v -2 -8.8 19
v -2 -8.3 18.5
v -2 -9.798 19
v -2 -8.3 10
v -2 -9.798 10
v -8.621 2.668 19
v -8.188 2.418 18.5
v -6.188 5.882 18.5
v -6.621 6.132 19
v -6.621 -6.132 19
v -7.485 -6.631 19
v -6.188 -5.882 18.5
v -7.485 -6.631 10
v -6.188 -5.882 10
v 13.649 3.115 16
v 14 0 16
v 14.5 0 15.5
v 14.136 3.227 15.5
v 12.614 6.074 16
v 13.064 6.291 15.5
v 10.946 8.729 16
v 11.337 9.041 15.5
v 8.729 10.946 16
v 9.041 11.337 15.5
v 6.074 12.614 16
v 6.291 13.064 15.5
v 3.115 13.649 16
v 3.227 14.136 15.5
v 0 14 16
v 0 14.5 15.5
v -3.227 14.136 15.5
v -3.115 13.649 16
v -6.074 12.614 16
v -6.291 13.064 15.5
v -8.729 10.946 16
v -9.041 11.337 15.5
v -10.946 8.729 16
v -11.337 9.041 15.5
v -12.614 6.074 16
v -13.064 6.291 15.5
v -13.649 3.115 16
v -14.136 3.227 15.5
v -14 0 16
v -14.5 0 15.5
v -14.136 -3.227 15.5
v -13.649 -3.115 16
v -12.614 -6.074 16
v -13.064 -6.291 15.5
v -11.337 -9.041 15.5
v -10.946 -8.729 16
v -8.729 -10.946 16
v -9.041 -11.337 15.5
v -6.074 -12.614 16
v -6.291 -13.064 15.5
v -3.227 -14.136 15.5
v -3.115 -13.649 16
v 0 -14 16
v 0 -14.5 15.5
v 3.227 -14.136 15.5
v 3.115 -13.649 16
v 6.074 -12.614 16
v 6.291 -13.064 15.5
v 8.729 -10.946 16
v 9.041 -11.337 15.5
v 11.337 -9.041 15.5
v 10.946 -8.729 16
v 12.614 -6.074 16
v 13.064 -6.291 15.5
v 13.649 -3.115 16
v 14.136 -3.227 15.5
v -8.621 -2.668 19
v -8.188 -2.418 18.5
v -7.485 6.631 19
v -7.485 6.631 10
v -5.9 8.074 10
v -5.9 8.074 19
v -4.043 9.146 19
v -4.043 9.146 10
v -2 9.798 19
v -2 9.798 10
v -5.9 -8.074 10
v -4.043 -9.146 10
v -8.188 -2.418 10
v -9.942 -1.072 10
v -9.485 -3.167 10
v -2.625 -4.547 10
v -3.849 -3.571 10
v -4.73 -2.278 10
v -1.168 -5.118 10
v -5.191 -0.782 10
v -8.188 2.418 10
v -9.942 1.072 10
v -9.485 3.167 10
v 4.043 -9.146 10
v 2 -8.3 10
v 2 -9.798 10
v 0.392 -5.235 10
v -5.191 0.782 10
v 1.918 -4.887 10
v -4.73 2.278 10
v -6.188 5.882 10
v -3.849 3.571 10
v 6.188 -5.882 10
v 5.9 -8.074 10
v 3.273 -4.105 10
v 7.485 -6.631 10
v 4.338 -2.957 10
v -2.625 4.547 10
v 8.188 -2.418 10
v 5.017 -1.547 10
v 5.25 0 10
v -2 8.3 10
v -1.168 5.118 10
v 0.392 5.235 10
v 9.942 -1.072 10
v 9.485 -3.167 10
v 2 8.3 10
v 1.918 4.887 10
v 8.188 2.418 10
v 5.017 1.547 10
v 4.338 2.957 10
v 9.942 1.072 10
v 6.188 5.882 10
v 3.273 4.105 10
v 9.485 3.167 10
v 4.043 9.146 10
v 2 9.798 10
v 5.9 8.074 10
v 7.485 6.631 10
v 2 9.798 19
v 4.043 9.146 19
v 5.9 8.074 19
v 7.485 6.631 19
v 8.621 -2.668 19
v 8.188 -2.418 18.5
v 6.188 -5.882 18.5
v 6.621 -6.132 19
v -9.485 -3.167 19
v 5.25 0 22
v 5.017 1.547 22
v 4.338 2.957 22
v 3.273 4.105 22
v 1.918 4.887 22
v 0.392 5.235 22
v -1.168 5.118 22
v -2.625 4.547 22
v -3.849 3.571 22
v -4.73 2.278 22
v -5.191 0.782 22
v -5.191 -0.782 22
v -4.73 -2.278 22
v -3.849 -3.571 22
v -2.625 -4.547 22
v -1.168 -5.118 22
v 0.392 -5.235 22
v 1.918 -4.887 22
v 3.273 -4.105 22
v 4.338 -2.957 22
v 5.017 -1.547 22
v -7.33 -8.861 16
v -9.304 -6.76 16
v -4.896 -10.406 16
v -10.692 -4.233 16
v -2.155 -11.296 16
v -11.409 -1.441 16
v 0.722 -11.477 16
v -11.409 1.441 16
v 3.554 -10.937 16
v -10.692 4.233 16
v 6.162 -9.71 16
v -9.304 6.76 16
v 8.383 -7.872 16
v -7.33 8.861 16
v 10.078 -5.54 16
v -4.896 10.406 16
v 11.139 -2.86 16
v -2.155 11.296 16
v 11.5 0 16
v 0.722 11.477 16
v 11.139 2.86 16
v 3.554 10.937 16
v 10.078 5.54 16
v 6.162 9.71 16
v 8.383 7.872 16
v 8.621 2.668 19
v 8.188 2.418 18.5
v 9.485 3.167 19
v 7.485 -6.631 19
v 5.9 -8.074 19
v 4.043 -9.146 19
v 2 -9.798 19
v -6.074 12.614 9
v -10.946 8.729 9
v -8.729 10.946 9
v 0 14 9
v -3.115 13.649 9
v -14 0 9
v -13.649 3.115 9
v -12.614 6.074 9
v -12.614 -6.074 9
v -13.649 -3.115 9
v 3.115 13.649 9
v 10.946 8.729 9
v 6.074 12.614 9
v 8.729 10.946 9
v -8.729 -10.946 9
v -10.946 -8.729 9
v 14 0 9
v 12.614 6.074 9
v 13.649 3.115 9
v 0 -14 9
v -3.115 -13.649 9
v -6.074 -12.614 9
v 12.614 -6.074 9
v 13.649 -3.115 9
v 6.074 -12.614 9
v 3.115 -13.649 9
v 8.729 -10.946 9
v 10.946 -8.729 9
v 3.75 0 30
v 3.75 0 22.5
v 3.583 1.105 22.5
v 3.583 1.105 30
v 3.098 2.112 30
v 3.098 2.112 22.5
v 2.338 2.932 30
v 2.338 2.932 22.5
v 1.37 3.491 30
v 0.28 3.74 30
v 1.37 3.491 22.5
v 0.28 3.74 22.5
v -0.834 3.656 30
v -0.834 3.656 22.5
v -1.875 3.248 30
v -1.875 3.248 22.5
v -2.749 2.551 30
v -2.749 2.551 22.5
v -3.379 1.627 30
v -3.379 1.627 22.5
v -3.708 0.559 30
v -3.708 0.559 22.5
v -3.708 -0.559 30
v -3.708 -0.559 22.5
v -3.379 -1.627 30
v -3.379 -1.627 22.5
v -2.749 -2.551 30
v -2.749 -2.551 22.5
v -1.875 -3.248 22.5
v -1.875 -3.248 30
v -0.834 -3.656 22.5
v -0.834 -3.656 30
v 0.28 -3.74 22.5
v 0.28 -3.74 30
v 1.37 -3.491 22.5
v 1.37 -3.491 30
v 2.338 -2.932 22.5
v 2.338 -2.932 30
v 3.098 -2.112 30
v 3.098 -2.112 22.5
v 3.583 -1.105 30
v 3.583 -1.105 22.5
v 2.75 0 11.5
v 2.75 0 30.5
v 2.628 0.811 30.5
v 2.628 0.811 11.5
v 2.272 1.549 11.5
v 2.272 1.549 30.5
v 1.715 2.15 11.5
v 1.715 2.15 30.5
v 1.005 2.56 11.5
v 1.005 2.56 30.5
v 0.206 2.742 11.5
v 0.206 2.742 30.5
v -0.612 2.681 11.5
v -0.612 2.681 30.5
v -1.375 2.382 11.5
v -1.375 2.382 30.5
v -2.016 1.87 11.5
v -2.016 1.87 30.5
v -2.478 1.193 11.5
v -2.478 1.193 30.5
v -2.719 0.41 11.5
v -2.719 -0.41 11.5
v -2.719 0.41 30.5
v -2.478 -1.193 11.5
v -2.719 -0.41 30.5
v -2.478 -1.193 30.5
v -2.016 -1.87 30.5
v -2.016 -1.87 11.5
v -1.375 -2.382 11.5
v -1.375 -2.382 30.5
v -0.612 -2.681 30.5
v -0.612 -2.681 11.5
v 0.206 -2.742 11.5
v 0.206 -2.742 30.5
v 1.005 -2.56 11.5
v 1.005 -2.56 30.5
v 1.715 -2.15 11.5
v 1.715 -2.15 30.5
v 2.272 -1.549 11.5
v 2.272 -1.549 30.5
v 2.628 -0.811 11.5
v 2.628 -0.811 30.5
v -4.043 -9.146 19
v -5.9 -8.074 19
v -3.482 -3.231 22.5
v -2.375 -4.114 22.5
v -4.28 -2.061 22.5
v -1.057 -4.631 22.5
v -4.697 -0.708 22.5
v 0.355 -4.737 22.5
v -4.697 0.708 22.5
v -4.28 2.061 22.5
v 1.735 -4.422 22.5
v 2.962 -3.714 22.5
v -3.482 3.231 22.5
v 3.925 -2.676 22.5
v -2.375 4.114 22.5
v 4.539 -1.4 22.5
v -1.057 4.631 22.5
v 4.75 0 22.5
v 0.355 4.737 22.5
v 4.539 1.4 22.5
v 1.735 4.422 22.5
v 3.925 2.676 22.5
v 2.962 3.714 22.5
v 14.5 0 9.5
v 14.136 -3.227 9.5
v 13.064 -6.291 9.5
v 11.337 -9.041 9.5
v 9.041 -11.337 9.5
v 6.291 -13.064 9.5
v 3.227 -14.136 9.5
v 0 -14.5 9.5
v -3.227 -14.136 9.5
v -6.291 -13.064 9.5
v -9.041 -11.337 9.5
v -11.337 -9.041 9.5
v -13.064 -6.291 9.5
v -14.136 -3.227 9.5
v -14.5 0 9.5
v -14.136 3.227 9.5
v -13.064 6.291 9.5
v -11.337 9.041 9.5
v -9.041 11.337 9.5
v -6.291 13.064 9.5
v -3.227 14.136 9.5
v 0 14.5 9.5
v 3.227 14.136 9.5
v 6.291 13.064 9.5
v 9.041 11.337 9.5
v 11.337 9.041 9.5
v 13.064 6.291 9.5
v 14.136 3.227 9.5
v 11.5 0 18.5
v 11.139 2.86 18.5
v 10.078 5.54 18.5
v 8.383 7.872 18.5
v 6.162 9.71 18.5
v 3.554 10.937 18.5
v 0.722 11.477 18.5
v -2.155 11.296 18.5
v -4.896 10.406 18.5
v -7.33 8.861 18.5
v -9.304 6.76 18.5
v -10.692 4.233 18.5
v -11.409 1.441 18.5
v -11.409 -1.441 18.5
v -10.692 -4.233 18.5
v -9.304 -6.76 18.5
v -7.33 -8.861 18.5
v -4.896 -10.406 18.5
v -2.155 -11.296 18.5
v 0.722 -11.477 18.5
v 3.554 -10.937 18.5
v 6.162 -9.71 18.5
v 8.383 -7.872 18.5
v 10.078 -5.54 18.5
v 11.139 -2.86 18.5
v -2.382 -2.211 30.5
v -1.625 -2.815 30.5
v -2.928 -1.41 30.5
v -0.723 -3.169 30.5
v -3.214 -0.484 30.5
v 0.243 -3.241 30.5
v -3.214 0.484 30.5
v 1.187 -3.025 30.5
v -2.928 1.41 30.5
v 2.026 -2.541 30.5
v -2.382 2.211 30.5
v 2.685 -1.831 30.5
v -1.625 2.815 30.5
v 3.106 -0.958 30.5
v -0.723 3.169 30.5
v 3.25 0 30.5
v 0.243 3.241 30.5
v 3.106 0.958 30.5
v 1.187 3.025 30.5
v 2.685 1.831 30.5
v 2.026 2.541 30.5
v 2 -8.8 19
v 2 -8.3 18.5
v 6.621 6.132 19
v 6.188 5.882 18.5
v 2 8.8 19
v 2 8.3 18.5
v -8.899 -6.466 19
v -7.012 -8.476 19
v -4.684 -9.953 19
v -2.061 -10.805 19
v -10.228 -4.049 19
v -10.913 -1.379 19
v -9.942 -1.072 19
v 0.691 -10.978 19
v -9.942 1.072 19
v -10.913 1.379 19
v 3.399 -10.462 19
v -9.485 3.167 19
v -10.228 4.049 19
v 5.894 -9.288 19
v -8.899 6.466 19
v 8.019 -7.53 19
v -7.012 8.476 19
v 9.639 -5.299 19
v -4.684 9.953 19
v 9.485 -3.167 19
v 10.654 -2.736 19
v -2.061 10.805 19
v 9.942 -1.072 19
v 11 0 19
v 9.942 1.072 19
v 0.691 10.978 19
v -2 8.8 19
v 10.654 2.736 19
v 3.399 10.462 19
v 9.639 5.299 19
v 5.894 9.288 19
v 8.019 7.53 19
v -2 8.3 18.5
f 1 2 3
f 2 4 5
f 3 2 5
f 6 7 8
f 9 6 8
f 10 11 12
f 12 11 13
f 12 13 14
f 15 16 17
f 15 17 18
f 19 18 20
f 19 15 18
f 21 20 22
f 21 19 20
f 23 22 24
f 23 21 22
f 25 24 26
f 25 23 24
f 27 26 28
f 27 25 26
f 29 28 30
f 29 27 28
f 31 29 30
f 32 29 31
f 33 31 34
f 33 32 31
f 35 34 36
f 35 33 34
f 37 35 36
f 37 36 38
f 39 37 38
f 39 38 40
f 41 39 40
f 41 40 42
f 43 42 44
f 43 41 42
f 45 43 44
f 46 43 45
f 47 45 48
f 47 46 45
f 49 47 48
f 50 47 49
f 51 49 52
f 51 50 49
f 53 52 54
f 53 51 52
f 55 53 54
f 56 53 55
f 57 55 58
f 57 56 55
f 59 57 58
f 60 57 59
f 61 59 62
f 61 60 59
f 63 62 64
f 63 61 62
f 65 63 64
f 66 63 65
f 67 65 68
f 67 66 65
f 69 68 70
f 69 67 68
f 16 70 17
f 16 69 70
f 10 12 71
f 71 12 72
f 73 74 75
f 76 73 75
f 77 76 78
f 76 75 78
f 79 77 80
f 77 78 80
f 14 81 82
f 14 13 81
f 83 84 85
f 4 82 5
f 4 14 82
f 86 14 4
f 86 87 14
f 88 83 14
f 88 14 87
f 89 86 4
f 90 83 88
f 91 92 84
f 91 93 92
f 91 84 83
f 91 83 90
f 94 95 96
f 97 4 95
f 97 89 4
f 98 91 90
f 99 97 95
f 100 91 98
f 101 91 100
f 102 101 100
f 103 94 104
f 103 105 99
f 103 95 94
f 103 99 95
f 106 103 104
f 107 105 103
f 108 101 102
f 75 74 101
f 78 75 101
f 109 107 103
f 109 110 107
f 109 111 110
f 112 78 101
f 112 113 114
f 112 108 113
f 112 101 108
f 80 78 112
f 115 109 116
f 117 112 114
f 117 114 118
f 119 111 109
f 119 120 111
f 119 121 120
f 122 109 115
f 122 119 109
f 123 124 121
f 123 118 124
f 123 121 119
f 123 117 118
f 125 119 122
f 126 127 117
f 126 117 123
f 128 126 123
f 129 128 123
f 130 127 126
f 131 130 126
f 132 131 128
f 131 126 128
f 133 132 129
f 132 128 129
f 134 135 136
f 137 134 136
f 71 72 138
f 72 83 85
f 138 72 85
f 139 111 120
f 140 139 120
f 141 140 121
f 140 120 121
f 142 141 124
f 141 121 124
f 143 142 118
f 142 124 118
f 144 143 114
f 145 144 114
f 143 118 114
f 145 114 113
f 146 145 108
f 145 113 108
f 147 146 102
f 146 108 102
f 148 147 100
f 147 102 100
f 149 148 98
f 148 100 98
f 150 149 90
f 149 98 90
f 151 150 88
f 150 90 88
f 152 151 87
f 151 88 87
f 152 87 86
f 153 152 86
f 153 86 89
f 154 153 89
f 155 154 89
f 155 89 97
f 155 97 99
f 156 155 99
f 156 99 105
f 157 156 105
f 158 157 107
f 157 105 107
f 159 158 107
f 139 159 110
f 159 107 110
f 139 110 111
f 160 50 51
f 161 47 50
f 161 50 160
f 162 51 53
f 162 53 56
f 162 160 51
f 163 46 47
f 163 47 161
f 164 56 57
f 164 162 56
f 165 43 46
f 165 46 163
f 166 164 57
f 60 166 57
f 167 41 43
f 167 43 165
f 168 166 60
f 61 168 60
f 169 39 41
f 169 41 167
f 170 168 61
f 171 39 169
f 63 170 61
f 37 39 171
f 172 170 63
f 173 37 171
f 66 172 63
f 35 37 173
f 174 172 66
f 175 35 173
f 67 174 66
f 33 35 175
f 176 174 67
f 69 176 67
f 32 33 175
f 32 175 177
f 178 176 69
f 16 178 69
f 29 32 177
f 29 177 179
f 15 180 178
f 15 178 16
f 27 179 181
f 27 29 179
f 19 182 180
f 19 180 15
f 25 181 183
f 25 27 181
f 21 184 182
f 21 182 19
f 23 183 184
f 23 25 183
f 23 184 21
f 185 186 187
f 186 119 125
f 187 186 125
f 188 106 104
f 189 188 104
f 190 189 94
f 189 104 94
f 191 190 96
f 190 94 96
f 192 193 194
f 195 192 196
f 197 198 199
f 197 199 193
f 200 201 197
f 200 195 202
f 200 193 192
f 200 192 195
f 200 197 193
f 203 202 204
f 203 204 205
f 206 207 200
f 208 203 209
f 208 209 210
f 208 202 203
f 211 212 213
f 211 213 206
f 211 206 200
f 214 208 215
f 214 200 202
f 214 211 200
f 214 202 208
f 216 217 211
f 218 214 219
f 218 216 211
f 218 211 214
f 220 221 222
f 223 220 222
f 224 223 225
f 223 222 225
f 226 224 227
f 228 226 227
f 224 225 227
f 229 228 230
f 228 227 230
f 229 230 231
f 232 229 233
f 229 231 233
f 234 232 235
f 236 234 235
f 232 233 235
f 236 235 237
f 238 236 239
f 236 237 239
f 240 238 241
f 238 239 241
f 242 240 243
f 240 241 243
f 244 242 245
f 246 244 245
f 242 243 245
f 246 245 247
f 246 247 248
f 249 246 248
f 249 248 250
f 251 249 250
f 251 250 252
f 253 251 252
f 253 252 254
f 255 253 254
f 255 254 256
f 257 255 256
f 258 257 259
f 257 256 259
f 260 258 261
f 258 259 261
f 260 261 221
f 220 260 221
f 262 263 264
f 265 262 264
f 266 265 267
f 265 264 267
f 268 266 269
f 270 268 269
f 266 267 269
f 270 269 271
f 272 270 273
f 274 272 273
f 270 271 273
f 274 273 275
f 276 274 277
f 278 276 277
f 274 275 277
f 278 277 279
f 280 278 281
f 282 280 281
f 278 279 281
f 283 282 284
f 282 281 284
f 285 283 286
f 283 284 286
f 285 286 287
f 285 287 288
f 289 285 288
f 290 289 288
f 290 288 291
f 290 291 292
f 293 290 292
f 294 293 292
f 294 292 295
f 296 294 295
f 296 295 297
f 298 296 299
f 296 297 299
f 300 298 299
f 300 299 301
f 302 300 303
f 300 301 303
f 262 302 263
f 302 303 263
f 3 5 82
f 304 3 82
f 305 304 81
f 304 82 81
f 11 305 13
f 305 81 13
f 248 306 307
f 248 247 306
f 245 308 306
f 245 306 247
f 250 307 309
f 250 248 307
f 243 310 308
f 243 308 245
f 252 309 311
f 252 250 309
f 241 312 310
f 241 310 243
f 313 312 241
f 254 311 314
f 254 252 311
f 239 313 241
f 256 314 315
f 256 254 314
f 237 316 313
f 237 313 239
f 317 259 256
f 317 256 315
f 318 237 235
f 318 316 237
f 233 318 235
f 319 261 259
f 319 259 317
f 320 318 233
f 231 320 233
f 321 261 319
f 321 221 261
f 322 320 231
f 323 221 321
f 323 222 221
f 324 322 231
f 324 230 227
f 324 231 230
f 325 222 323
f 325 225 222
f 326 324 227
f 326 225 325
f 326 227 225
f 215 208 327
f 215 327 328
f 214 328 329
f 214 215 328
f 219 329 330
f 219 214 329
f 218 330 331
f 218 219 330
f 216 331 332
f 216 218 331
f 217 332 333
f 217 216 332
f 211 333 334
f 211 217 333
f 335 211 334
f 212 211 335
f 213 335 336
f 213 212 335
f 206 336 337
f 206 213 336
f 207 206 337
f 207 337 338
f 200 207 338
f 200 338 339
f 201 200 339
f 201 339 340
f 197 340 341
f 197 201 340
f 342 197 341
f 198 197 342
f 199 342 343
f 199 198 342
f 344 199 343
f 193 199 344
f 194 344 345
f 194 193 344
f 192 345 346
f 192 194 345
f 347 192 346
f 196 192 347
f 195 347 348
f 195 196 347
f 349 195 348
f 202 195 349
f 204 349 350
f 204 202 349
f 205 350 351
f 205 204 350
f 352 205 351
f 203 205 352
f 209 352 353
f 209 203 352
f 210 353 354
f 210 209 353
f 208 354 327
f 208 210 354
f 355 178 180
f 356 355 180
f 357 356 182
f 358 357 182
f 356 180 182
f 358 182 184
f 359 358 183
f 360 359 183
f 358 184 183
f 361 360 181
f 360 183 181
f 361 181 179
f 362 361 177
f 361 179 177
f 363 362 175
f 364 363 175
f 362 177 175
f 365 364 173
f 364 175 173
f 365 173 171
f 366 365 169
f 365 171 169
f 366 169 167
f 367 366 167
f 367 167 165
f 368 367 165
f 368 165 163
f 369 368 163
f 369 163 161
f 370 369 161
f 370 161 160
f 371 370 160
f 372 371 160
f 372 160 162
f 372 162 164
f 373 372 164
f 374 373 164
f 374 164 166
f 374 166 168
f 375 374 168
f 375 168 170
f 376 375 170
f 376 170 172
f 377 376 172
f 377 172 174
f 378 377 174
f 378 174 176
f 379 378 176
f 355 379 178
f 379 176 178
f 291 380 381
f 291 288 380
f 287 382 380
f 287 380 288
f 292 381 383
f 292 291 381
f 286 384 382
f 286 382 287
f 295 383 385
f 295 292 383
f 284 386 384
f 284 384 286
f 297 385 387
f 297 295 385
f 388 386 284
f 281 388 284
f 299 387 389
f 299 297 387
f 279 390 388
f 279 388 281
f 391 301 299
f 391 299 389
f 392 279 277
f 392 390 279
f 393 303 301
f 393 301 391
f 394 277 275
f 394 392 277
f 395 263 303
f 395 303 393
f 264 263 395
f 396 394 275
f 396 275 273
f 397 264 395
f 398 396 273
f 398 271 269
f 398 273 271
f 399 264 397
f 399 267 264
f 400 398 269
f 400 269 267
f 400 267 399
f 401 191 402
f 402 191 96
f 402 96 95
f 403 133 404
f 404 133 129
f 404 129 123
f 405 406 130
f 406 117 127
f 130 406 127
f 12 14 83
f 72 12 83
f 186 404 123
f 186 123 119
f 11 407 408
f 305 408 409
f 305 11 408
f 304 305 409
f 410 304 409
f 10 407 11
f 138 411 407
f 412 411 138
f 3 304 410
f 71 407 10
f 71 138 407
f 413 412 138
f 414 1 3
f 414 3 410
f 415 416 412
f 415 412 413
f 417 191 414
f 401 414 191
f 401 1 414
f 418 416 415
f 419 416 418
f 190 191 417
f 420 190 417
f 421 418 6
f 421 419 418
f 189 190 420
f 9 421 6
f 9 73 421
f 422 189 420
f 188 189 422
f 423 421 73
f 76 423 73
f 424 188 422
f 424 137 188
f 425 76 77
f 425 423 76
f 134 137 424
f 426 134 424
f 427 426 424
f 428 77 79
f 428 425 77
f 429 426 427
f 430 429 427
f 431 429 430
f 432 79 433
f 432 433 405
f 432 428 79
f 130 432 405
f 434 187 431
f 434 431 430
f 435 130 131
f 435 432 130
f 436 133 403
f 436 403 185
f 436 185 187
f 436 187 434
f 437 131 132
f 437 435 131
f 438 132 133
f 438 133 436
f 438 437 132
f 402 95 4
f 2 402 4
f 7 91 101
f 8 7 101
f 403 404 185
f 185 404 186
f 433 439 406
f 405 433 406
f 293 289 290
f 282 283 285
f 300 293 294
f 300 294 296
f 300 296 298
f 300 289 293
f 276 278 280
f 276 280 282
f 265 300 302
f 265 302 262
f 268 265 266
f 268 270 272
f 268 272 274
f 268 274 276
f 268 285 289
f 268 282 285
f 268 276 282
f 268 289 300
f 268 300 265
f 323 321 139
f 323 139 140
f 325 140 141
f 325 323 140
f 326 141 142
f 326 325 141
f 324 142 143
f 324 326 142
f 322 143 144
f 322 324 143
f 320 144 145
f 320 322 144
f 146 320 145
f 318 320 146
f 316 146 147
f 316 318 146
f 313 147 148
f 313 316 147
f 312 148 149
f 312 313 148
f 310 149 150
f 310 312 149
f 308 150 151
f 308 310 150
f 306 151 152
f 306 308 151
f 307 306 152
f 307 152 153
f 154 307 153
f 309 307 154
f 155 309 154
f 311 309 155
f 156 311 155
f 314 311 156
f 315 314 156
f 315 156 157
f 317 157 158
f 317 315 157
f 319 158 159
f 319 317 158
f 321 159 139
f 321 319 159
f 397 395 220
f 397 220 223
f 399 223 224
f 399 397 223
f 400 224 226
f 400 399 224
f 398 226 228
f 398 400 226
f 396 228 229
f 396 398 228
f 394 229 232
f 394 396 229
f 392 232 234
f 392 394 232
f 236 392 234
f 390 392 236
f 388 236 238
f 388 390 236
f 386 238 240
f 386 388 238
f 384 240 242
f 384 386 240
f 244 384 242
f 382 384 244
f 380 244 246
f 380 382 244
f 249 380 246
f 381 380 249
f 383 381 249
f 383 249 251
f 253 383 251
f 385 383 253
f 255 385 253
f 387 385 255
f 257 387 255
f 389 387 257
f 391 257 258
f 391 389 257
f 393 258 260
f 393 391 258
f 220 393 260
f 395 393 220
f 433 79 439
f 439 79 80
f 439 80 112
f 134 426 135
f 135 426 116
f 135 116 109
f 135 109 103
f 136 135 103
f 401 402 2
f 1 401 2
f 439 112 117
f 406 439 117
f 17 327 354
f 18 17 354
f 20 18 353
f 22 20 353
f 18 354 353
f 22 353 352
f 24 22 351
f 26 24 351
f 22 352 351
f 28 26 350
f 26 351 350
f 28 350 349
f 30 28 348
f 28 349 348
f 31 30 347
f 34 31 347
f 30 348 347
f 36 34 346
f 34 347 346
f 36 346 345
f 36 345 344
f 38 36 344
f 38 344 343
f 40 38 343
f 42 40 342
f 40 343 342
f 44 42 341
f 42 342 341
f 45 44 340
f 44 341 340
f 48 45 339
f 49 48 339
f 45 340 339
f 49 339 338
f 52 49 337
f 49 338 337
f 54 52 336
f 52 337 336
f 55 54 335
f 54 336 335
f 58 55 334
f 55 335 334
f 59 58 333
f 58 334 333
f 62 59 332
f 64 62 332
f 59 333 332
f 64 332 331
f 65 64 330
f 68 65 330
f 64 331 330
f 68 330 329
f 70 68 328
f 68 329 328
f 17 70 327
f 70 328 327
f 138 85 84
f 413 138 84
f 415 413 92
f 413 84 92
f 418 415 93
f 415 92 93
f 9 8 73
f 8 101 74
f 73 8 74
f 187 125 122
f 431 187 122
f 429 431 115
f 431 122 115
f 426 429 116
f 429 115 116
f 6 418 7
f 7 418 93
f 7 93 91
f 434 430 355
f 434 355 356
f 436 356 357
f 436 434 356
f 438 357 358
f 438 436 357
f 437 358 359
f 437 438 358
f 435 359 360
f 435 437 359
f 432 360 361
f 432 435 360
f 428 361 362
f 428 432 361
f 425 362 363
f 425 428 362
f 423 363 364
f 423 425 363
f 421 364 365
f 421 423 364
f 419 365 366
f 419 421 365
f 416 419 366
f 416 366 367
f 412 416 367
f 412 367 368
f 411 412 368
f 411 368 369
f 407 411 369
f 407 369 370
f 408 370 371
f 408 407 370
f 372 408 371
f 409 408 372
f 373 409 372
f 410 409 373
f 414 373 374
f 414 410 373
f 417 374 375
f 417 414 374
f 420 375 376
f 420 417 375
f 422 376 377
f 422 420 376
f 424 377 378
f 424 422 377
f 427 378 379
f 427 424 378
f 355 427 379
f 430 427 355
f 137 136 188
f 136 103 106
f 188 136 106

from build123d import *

# Parameters (mm, degrees)
F0_R      = 14.5
F1_DEPTH  = 10
F2_R      = 11.5
F3_DEPTH  = 9
F4_SIZE   = 0.5
F5_R      = 5.25
F6_DEPTH  = 12.5
F7_SIZE   = 0.5
F8_R      = 3.75
F9_DEPTH  = 8
F10_SIZE  = 0.5
F11_R     = 14.5
F11_R_2   = 11.5
F12_DEPTH = 6
F13_R     = 25
F14_DEPTH = 9
F15_SIZE  = 0.5
F16_R     = 2.75
F17_DEPTH = 19


with BuildPart() as f1:
    # F0 (on Top) → F1 (new body)
    with BuildSketch(Plane.XY):
        Circle(F0_R)
    extrude(amount=F1_DEPTH)

    # F2 (on face) → F3 (join)
    with BuildSketch(Plane.XY.offset(10)):
        Circle(F2_R)
        with BuildLine():
            ThreePointArc((-7.4852813742, 6.6310302931), (-5, 8.6602540378), (-2, 9.7979589711))
            Line((-2, 9.7979589711), (-2, 8.3))
            Line((-2, 8.3), (2, 8.3))
            Line((2, 8.3), (2, 9.7979589711))
            ThreePointArc((2, 9.7979589711), (5, 8.6602540378), (7.4852813742, 6.6310302931))
            Line((7.4852813742, 6.6310302931), (6.1880108514, 5.8820508076))
            Line((6.1880108514, 5.8820508076), (8.1880108514, 2.4179491924))
            Line((8.1880108514, 2.4179491924), (9.4852813742, 3.166928678))
            ThreePointArc((9.4852813742, 3.166928678), (10, 0), (9.4852813742, -3.166928678))
            Line((9.4852813742, -3.166928678), (8.1880108514, -2.4179491924))
            Line((8.1880108514, -2.4179491924), (6.1880108514, -5.8820508076))
            Line((6.1880108514, -5.8820508076), (7.4852813742, -6.6310302931))
            ThreePointArc((7.4852813742, -6.6310302931), (5, -8.6602540378), (2, -9.7979589711))
            Line((2, -9.7979589711), (2, -8.3))
            Line((2, -8.3), (-2, -8.3))
            Line((-2, -8.3), (-2, -9.7979589711))
            ThreePointArc((-2, -9.7979589711), (-5, -8.6602540378), (-7.4852813742, -6.6310302931))
            Line((-7.4852813742, -6.6310302931), (-6.1880108514, -5.8820508076))
            Line((-6.1880108514, -5.8820508076), (-8.1880108514, -2.4179491924))
            Line((-8.1880108514, -2.4179491924), (-9.4852813742, -3.166928678))
            ThreePointArc((-9.4852813742, -3.166928678), (-10, 0), (-9.4852813742, 3.166928678))
            Line((-9.4852813742, 3.166928678), (-8.1880108514, 2.4179491924))
            Line((-8.1880108514, 2.4179491924), (-6.1880108514, 5.8820508076))
            Line((-6.1880108514, 5.8820508076), (-7.4852813742, 6.6310302931))
        make_face(mode=Mode.SUBTRACT)
    extrude(amount=F3_DEPTH)

    # F4
    f4_edges = [f1.edges().sort_by_distance(p)[0] for p in [
        (0, 8.3, 19),
        (-7.188011, 4.15, 19),
        (-7.188011, -4.15, 19),
        (0, -8.3, 19),
        (7.188011, -4.15, 19),
        (7.188011, 4.15, 19),
    ]]
    chamfer(f4_edges, length=F4_SIZE)

    # F5 (on face) → F6 (join)
    with BuildSketch(Plane.XY.offset(10)):
        Circle(F5_R)
    extrude(amount=F6_DEPTH)

    # F7
    f7_edges = [f1.edges().sort_by_distance(p)[0] for p in [
        (-5.25, 0, 22.5),
    ]]
    chamfer(f7_edges, length=F7_SIZE)

    # F8 (on face) → F9 (join)
    with BuildSketch(Plane.XY.offset(22.5)):
        Circle(F8_R)
    extrude(amount=F9_DEPTH)

    # F10
    f10_edges = [f1.edges().sort_by_distance(p)[0] for p in [
        (-3.75, 0, 30.5),
    ]]
    chamfer(f10_edges, length=F10_SIZE)

    # F11 (on face) → F12 (join)
    with BuildSketch(Plane.XY.offset(10)):
        Circle(F11_R)
        Circle(F11_R_2, mode=Mode.SUBTRACT)
    extrude(amount=F12_DEPTH)

    # F13 (on face) → F14 (cut)
    with BuildSketch(Plane(origin=(0, 0, 0), x_dir=(1, 0, 0), z_dir=(0, 0, -1))):
        Circle(F13_R)
    extrude(amount=-F14_DEPTH, mode=Mode.SUBTRACT)

    # F15
    f15_edges = [f1.edges().sort_by_distance(p)[0] for p in [
        (-11.5, 0, 19),
        (-14.5, 0, 16),
        (-14.5, 0, 9),
    ]]
    chamfer(f15_edges, length=F15_SIZE)

    # F16 (on face) → F17 (cut)
    with BuildSketch(Plane.XY.offset(30.5)):
        Circle(F16_R)
    extrude(amount=-F17_DEPTH, mode=Mode.SUBTRACT)


solid = f1.part
